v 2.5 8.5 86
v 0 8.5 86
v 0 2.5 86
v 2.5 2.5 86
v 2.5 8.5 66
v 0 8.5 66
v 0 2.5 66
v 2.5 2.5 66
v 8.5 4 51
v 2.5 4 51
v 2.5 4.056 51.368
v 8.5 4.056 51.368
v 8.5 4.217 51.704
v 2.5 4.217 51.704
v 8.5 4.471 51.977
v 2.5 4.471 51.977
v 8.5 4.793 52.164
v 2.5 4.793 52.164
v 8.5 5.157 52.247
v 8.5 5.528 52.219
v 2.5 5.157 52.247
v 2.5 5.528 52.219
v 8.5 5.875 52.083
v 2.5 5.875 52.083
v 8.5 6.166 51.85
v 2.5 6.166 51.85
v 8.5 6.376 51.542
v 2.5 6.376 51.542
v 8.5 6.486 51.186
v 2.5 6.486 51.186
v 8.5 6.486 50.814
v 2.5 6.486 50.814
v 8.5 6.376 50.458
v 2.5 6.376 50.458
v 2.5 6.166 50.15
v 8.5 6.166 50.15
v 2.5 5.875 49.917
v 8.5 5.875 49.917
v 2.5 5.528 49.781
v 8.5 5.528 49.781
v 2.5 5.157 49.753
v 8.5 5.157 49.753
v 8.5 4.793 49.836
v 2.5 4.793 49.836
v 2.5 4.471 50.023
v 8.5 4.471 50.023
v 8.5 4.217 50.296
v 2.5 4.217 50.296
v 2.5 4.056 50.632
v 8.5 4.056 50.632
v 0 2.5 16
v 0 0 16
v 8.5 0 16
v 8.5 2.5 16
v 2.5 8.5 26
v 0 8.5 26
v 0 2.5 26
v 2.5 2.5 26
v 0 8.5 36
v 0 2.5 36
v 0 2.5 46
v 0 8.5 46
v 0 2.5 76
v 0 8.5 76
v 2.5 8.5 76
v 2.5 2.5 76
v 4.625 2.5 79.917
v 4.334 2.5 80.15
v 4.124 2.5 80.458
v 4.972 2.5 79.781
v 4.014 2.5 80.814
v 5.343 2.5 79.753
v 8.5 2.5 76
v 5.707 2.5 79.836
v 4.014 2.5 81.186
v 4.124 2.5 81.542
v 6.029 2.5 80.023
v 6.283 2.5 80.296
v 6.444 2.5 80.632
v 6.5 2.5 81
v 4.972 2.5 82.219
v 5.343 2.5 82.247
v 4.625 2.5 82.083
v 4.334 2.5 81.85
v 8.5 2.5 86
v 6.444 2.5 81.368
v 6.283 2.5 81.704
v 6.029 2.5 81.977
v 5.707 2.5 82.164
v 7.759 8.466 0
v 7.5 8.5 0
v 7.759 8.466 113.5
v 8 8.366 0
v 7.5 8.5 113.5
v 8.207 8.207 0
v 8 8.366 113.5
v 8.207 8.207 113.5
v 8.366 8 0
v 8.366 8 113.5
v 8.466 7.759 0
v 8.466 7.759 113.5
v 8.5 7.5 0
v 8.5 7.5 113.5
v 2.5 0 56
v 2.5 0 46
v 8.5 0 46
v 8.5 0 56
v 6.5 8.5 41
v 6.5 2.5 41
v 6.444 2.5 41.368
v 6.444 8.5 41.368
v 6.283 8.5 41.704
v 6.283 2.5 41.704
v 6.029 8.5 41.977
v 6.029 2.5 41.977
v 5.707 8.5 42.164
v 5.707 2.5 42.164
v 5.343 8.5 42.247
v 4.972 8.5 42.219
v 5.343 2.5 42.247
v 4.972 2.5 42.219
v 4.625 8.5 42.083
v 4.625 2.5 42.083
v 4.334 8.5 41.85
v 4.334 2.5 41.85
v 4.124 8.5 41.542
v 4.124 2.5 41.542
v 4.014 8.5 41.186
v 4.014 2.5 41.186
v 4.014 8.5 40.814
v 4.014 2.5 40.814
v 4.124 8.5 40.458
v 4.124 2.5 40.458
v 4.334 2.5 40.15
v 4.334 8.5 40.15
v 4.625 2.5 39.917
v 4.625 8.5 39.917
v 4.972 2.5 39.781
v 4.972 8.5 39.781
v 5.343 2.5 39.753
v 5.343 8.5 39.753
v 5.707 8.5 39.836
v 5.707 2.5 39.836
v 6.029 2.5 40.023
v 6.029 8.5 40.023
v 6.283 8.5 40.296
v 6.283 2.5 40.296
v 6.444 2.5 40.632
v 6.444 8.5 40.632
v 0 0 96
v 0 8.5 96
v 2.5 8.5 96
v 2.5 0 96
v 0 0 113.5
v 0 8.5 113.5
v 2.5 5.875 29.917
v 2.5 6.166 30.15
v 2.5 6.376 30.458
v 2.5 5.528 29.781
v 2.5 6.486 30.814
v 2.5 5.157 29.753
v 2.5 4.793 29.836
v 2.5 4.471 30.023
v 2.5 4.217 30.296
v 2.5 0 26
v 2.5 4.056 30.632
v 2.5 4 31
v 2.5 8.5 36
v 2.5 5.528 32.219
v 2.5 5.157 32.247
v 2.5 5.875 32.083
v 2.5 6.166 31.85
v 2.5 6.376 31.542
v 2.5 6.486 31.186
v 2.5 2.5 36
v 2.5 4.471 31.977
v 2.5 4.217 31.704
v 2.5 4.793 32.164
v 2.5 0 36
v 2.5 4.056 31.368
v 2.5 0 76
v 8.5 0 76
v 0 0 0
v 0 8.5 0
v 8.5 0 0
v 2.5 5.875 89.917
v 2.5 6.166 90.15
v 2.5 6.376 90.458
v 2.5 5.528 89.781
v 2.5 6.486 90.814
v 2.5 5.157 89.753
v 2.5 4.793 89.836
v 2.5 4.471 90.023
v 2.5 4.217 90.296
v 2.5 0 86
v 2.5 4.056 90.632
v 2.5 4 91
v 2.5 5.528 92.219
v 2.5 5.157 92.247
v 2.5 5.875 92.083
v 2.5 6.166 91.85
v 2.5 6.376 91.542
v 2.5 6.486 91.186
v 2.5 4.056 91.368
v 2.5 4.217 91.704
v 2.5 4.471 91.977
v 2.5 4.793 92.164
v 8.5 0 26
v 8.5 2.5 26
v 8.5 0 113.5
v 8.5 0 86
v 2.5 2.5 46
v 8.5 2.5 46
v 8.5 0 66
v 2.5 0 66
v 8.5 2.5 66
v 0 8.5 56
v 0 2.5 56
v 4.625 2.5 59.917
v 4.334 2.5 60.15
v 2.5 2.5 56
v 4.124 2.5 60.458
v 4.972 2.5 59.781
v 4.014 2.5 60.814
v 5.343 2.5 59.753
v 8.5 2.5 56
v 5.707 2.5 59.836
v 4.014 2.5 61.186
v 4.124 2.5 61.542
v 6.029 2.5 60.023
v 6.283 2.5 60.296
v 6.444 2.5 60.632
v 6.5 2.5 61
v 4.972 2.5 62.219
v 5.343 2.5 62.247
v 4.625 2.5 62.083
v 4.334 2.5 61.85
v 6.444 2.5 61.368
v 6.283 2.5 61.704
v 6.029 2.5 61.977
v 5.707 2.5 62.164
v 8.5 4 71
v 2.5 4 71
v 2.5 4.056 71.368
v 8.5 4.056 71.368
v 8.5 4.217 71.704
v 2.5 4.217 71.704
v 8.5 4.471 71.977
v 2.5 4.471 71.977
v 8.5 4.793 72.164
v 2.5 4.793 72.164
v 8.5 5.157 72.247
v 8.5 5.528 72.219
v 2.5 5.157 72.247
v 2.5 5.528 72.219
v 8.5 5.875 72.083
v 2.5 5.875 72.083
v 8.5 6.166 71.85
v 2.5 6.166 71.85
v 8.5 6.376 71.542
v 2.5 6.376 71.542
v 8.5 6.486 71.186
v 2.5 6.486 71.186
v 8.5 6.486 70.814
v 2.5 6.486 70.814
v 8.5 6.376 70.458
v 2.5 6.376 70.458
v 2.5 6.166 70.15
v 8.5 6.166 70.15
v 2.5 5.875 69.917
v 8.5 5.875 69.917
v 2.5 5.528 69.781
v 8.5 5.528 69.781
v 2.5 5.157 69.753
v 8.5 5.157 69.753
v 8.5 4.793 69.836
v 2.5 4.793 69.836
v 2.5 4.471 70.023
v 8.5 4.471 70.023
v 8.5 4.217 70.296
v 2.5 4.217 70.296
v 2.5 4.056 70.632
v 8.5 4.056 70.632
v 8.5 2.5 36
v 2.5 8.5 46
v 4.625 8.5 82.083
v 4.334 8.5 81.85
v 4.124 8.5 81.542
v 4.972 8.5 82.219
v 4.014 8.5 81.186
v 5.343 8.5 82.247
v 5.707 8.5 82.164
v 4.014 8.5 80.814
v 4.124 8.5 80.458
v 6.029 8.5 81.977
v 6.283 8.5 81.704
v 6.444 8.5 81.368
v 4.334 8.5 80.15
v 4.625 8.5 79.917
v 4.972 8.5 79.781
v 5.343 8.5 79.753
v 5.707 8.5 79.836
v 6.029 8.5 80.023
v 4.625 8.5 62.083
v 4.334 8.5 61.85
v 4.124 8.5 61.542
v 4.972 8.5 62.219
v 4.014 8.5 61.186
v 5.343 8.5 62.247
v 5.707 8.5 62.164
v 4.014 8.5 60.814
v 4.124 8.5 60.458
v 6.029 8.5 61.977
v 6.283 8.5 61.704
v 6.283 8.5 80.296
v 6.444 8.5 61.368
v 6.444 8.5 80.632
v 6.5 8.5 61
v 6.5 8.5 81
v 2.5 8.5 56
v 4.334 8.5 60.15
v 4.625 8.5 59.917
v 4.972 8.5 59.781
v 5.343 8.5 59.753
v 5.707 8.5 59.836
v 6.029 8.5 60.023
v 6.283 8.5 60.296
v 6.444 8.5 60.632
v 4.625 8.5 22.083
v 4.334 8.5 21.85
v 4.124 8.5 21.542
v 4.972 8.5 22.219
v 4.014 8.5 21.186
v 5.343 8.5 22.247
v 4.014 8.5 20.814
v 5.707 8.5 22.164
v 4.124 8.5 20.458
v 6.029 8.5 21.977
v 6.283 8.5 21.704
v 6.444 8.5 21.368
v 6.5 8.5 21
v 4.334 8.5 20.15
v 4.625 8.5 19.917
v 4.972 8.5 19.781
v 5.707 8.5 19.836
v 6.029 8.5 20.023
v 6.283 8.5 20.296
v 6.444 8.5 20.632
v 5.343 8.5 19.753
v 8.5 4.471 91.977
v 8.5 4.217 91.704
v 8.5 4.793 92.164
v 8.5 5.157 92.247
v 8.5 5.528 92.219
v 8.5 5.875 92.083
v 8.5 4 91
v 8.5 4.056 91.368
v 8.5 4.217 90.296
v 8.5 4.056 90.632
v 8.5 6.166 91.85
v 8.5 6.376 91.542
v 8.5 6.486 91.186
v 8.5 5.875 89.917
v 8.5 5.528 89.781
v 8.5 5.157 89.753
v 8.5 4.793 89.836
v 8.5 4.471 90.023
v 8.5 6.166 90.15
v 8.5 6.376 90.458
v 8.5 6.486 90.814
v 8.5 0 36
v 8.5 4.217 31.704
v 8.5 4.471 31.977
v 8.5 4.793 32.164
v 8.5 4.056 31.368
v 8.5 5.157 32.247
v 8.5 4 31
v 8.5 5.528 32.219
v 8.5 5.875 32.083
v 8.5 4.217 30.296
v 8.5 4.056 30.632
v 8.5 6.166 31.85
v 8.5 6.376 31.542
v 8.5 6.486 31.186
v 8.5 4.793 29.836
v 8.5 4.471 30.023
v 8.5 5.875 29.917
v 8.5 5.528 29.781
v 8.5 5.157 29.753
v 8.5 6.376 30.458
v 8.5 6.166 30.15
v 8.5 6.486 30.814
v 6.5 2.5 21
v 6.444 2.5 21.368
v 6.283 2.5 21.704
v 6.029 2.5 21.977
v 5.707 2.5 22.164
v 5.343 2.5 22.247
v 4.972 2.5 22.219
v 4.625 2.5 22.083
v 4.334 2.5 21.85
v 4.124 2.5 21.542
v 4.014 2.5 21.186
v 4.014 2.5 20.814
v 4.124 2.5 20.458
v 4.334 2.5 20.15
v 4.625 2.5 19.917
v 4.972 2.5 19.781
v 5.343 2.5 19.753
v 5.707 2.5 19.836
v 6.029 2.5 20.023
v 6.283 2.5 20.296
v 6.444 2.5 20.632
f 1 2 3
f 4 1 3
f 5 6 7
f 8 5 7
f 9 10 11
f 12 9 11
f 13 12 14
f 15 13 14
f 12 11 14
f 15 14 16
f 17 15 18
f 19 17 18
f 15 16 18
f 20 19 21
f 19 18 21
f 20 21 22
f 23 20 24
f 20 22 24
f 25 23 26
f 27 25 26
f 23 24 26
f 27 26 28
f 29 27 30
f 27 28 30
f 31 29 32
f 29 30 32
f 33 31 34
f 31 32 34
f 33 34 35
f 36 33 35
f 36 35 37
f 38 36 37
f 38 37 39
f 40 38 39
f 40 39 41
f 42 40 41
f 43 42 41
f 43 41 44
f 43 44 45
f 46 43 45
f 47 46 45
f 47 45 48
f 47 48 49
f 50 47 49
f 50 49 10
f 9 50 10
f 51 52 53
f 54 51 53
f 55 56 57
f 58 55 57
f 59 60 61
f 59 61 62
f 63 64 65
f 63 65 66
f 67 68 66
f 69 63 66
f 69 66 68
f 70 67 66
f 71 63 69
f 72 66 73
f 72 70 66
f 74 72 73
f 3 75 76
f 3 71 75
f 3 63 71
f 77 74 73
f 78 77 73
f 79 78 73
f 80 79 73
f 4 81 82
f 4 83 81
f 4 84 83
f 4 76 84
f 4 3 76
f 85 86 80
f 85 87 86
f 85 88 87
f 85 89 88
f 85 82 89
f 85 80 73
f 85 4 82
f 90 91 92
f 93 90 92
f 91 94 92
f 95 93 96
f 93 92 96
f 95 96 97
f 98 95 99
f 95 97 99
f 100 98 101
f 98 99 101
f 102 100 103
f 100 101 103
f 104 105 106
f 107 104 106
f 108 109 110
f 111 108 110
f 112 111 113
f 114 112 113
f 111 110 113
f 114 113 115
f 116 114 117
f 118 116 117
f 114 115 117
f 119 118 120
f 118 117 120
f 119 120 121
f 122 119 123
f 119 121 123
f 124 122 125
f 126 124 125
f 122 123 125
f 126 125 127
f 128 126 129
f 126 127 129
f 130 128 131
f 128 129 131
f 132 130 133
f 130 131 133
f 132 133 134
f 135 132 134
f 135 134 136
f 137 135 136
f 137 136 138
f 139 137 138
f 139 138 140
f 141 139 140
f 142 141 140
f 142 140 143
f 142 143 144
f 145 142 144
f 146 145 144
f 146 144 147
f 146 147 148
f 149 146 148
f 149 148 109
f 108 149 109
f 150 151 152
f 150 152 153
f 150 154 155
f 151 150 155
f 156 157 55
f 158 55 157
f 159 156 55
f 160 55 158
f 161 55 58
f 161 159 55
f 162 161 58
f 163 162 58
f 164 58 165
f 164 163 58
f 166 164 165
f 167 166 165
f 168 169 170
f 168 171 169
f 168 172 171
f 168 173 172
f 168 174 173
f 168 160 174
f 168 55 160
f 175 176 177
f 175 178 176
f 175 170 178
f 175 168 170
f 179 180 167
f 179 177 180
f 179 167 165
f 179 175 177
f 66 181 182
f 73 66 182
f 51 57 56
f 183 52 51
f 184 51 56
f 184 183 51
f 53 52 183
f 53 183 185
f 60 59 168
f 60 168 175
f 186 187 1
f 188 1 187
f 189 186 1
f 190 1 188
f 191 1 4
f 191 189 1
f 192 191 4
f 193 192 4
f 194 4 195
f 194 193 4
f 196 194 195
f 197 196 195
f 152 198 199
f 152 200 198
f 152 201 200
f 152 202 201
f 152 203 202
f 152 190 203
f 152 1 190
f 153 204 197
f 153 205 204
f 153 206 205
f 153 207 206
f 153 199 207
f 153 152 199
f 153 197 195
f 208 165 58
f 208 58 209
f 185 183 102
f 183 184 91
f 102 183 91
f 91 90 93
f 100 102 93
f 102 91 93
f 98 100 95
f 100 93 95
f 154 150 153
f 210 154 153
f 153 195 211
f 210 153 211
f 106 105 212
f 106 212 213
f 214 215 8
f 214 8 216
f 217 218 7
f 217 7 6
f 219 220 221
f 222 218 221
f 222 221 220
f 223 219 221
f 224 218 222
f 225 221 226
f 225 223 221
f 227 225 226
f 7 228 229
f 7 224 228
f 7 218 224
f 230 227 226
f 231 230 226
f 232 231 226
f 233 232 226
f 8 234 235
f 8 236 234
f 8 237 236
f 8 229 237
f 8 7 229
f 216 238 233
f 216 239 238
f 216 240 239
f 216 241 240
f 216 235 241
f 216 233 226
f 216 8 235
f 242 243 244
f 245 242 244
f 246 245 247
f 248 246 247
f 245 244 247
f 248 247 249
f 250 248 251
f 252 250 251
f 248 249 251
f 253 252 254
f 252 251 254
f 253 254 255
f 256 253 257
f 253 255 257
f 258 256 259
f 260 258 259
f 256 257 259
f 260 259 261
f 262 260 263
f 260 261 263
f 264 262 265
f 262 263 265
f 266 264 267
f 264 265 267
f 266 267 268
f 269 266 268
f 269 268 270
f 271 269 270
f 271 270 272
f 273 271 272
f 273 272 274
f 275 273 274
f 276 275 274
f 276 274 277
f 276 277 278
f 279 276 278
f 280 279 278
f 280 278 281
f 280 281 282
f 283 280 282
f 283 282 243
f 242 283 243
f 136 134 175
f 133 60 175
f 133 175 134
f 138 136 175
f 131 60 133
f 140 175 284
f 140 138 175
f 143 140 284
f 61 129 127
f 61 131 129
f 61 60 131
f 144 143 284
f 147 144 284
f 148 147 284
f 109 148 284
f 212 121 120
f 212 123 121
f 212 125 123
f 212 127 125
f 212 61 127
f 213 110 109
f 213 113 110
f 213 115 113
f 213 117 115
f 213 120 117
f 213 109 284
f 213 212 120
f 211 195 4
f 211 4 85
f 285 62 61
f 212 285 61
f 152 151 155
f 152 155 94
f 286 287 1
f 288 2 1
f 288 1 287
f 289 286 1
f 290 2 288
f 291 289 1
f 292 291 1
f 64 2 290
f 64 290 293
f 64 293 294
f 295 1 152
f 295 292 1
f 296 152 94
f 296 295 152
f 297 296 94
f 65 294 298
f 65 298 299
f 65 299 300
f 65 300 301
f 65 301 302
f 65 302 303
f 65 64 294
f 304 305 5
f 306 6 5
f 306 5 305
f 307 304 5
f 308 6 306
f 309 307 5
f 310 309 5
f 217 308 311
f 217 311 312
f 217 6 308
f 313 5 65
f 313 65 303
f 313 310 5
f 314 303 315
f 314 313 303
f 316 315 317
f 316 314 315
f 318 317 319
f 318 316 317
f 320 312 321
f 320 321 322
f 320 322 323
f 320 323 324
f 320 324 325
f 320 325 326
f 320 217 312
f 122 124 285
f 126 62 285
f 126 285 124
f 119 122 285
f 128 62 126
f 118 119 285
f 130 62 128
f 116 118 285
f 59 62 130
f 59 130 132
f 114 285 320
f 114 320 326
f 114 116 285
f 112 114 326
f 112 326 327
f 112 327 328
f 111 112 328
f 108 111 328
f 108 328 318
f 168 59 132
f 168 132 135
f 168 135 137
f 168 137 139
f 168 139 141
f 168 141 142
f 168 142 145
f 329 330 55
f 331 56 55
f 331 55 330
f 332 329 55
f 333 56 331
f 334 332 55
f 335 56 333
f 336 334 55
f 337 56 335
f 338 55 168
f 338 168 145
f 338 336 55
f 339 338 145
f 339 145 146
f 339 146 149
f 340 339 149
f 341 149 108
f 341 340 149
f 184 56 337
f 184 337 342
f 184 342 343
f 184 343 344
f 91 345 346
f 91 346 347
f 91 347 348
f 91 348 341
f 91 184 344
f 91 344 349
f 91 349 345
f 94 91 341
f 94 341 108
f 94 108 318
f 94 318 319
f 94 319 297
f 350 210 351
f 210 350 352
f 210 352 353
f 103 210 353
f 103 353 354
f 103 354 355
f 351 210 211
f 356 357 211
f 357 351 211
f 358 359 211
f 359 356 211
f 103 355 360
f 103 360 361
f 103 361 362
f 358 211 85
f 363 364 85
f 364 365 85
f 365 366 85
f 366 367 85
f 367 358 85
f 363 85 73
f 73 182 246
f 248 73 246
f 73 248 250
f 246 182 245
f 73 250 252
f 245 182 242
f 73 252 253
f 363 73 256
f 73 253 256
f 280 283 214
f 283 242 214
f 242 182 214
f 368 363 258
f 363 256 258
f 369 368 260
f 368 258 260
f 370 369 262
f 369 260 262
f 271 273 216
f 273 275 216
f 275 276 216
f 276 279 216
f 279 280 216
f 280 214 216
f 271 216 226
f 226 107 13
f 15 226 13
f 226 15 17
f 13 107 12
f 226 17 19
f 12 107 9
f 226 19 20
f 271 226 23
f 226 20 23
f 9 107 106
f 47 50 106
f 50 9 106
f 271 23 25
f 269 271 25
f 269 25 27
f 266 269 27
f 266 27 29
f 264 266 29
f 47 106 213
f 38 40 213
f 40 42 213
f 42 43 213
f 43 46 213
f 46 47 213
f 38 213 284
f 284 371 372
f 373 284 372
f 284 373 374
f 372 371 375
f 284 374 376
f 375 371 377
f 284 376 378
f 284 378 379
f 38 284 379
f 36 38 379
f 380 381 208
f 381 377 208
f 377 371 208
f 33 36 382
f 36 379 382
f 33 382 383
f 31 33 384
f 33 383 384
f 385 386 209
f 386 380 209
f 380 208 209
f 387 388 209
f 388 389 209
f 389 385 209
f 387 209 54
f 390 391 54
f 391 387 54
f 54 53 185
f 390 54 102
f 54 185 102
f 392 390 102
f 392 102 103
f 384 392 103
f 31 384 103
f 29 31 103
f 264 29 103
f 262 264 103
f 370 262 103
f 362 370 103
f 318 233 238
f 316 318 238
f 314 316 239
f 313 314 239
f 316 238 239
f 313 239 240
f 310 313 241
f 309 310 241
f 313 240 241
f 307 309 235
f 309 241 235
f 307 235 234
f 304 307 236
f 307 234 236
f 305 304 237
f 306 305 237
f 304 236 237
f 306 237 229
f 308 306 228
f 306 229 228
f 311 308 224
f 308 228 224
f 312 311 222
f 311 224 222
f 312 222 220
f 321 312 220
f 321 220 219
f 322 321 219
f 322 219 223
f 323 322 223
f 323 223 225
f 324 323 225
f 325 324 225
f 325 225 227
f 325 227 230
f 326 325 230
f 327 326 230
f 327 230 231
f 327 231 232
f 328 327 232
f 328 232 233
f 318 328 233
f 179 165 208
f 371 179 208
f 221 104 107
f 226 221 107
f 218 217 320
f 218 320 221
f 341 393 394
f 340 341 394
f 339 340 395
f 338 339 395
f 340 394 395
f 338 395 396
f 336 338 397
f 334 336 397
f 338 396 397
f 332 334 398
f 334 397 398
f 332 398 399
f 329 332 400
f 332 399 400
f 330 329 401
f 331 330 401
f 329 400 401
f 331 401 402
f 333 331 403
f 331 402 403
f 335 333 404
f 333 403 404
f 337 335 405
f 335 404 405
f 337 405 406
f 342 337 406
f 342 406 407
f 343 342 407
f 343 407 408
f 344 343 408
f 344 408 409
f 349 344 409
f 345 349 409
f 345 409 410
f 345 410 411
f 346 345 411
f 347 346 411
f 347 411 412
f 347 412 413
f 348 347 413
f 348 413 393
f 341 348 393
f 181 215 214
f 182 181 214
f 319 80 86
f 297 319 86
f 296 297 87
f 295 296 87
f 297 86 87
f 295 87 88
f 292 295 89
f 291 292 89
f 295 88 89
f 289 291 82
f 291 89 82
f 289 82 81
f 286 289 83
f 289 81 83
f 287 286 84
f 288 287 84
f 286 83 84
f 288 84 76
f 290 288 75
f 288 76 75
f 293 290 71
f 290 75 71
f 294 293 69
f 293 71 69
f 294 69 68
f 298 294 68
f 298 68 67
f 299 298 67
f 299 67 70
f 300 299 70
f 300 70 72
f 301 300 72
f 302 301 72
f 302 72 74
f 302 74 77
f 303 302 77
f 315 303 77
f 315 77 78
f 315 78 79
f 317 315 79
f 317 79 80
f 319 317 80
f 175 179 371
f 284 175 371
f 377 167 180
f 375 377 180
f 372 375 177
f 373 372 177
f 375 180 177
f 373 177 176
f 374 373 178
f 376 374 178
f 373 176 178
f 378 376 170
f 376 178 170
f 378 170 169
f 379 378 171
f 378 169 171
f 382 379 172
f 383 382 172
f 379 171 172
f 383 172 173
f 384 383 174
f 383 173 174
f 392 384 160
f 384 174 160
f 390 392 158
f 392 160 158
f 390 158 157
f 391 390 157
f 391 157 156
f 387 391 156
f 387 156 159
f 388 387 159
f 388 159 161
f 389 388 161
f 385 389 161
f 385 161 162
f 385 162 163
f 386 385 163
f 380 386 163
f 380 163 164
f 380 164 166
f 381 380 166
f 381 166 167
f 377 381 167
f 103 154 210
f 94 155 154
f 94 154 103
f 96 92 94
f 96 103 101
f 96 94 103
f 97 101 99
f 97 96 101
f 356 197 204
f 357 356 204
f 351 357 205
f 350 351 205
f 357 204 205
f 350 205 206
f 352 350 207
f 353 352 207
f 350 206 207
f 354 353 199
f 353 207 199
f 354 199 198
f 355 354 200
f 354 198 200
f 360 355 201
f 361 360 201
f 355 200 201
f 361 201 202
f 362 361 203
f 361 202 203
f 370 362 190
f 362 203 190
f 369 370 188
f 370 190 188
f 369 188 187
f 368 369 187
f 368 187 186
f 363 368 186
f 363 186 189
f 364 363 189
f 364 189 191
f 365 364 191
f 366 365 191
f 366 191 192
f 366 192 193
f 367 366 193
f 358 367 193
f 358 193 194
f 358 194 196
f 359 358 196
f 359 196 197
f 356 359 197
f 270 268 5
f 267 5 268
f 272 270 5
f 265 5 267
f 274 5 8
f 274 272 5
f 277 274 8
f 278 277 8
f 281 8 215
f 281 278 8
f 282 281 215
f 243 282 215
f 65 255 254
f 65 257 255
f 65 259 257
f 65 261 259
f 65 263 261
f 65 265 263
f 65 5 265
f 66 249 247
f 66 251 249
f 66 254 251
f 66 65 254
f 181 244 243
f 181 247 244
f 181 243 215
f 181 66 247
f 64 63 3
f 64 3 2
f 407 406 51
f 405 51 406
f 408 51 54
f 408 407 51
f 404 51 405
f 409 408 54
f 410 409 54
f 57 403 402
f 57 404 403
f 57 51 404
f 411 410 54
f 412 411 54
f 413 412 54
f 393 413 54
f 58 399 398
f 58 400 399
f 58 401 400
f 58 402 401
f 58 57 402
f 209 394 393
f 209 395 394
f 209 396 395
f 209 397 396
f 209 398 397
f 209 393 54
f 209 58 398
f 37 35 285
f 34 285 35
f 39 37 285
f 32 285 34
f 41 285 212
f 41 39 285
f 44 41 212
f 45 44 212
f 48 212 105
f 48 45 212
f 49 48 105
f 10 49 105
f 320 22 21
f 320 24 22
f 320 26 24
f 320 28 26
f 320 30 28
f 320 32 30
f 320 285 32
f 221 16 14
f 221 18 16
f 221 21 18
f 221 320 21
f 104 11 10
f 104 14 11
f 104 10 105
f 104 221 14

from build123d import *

# Parameters (mm, degrees)
SKETCH_W               = 8.5
SKETCH_H               = 8.5
PAD_DEPTH              = 113.5
SKETCH001_W            = 10
SKETCH001_H            = 10
POCKET_DEPTH           = 2.5
LINEARPATTERN_COUNT    = 4
LINEARPATTERN_PITCH    = 20
SKETCH002_W            = 10
SKETCH002_H            = 10
POCKET001_DEPTH        = 2.5
LINEARPATTERN001_COUNT = 4
LINEARPATTERN001_PITCH = 20
FILLET_R               = 1
SKETCH003_R            = 1.25
POCKET002_DEPTH        = 6.001
LINEARPATTERN002_COUNT = 4
LINEARPATTERN002_PITCH = 20
SKETCH004_R            = 1.25
POCKET003_DEPTH        = 6.001
LINEARPATTERN003_COUNT = 4
LINEARPATTERN003_PITCH = 20


with BuildPart() as part:
    # Sketch → Pad (new body)
    with BuildSketch(Plane.XY):
        with Locations((4.25, 4.25)):
            Rectangle(SKETCH_W, SKETCH_H)
    extrude(amount=PAD_DEPTH)

    # Sketch001 → Pocket (cut)
    with BuildSketch(Plane.XZ):
        with Locations((4.410969, 21)):
            Rectangle(SKETCH001_W, SKETCH001_H)
    pocket = extrude(amount=-POCKET_DEPTH, mode=Mode.SUBTRACT)

    # LinearPattern: Pocket ×4
    with Locations(*[(0, 0, i * LINEARPATTERN_PITCH) for i in range(1, LINEARPATTERN_COUNT)]):
        add(pocket, mode=Mode.SUBTRACT)

    # Sketch002 → Pocket001 (cut)
    with BuildSketch(Plane(origin=(0, 0, 0), x_dir=(0, -1, 0), z_dir=(-1, 0, 0))):
        with Locations((-4.326825, 31)):
            Rectangle(SKETCH002_W, SKETCH002_H)
    pocket001 = extrude(amount=-POCKET001_DEPTH, mode=Mode.SUBTRACT)

    # LinearPattern001: Pocket001 ×4
    with Locations(*[(0, 0, i * LINEARPATTERN001_PITCH) for i in range(1, LINEARPATTERN001_COUNT)]):
        add(pocket001, mode=Mode.SUBTRACT)

    # Fillet
    fillet_edges = [part.edges().sort_by_distance(p)[0] for p in [
        (8.5, 8.5, 56.75),
    ]]
    fillet(fillet_edges, radius=FILLET_R)

    # Sketch003 → Pocket002 (cut, through all)
    with BuildSketch(Plane.XZ.offset(-2.5)):
        with Locations((5.25, 21)):
            Circle(SKETCH003_R)
    pocket002 = extrude(amount=-POCKET002_DEPTH, mode=Mode.SUBTRACT)

    # LinearPattern002: Pocket002 ×4
    with Locations(*[(0, 0, i * LINEARPATTERN002_PITCH) for i in range(1, LINEARPATTERN002_COUNT)]):
        add(pocket002, mode=Mode.SUBTRACT)

    # Sketch004 → Pocket003 (cut, through all)
    with BuildSketch(Plane(origin=(2.5, 0, 0), x_dir=(0, -1, 0), z_dir=(-1, 0, 0))):
        with Locations((-5.25, 31)):
            Circle(SKETCH004_R)
    pocket003 = extrude(amount=-POCKET003_DEPTH, mode=Mode.SUBTRACT)

    # LinearPattern003: Pocket003 ×4
    with Locations(*[(0, 0, i * LINEARPATTERN003_PITCH) for i in range(1, LINEARPATTERN003_COUNT)]):
        add(pocket003, mode=Mode.SUBTRACT)


solid = part.part
